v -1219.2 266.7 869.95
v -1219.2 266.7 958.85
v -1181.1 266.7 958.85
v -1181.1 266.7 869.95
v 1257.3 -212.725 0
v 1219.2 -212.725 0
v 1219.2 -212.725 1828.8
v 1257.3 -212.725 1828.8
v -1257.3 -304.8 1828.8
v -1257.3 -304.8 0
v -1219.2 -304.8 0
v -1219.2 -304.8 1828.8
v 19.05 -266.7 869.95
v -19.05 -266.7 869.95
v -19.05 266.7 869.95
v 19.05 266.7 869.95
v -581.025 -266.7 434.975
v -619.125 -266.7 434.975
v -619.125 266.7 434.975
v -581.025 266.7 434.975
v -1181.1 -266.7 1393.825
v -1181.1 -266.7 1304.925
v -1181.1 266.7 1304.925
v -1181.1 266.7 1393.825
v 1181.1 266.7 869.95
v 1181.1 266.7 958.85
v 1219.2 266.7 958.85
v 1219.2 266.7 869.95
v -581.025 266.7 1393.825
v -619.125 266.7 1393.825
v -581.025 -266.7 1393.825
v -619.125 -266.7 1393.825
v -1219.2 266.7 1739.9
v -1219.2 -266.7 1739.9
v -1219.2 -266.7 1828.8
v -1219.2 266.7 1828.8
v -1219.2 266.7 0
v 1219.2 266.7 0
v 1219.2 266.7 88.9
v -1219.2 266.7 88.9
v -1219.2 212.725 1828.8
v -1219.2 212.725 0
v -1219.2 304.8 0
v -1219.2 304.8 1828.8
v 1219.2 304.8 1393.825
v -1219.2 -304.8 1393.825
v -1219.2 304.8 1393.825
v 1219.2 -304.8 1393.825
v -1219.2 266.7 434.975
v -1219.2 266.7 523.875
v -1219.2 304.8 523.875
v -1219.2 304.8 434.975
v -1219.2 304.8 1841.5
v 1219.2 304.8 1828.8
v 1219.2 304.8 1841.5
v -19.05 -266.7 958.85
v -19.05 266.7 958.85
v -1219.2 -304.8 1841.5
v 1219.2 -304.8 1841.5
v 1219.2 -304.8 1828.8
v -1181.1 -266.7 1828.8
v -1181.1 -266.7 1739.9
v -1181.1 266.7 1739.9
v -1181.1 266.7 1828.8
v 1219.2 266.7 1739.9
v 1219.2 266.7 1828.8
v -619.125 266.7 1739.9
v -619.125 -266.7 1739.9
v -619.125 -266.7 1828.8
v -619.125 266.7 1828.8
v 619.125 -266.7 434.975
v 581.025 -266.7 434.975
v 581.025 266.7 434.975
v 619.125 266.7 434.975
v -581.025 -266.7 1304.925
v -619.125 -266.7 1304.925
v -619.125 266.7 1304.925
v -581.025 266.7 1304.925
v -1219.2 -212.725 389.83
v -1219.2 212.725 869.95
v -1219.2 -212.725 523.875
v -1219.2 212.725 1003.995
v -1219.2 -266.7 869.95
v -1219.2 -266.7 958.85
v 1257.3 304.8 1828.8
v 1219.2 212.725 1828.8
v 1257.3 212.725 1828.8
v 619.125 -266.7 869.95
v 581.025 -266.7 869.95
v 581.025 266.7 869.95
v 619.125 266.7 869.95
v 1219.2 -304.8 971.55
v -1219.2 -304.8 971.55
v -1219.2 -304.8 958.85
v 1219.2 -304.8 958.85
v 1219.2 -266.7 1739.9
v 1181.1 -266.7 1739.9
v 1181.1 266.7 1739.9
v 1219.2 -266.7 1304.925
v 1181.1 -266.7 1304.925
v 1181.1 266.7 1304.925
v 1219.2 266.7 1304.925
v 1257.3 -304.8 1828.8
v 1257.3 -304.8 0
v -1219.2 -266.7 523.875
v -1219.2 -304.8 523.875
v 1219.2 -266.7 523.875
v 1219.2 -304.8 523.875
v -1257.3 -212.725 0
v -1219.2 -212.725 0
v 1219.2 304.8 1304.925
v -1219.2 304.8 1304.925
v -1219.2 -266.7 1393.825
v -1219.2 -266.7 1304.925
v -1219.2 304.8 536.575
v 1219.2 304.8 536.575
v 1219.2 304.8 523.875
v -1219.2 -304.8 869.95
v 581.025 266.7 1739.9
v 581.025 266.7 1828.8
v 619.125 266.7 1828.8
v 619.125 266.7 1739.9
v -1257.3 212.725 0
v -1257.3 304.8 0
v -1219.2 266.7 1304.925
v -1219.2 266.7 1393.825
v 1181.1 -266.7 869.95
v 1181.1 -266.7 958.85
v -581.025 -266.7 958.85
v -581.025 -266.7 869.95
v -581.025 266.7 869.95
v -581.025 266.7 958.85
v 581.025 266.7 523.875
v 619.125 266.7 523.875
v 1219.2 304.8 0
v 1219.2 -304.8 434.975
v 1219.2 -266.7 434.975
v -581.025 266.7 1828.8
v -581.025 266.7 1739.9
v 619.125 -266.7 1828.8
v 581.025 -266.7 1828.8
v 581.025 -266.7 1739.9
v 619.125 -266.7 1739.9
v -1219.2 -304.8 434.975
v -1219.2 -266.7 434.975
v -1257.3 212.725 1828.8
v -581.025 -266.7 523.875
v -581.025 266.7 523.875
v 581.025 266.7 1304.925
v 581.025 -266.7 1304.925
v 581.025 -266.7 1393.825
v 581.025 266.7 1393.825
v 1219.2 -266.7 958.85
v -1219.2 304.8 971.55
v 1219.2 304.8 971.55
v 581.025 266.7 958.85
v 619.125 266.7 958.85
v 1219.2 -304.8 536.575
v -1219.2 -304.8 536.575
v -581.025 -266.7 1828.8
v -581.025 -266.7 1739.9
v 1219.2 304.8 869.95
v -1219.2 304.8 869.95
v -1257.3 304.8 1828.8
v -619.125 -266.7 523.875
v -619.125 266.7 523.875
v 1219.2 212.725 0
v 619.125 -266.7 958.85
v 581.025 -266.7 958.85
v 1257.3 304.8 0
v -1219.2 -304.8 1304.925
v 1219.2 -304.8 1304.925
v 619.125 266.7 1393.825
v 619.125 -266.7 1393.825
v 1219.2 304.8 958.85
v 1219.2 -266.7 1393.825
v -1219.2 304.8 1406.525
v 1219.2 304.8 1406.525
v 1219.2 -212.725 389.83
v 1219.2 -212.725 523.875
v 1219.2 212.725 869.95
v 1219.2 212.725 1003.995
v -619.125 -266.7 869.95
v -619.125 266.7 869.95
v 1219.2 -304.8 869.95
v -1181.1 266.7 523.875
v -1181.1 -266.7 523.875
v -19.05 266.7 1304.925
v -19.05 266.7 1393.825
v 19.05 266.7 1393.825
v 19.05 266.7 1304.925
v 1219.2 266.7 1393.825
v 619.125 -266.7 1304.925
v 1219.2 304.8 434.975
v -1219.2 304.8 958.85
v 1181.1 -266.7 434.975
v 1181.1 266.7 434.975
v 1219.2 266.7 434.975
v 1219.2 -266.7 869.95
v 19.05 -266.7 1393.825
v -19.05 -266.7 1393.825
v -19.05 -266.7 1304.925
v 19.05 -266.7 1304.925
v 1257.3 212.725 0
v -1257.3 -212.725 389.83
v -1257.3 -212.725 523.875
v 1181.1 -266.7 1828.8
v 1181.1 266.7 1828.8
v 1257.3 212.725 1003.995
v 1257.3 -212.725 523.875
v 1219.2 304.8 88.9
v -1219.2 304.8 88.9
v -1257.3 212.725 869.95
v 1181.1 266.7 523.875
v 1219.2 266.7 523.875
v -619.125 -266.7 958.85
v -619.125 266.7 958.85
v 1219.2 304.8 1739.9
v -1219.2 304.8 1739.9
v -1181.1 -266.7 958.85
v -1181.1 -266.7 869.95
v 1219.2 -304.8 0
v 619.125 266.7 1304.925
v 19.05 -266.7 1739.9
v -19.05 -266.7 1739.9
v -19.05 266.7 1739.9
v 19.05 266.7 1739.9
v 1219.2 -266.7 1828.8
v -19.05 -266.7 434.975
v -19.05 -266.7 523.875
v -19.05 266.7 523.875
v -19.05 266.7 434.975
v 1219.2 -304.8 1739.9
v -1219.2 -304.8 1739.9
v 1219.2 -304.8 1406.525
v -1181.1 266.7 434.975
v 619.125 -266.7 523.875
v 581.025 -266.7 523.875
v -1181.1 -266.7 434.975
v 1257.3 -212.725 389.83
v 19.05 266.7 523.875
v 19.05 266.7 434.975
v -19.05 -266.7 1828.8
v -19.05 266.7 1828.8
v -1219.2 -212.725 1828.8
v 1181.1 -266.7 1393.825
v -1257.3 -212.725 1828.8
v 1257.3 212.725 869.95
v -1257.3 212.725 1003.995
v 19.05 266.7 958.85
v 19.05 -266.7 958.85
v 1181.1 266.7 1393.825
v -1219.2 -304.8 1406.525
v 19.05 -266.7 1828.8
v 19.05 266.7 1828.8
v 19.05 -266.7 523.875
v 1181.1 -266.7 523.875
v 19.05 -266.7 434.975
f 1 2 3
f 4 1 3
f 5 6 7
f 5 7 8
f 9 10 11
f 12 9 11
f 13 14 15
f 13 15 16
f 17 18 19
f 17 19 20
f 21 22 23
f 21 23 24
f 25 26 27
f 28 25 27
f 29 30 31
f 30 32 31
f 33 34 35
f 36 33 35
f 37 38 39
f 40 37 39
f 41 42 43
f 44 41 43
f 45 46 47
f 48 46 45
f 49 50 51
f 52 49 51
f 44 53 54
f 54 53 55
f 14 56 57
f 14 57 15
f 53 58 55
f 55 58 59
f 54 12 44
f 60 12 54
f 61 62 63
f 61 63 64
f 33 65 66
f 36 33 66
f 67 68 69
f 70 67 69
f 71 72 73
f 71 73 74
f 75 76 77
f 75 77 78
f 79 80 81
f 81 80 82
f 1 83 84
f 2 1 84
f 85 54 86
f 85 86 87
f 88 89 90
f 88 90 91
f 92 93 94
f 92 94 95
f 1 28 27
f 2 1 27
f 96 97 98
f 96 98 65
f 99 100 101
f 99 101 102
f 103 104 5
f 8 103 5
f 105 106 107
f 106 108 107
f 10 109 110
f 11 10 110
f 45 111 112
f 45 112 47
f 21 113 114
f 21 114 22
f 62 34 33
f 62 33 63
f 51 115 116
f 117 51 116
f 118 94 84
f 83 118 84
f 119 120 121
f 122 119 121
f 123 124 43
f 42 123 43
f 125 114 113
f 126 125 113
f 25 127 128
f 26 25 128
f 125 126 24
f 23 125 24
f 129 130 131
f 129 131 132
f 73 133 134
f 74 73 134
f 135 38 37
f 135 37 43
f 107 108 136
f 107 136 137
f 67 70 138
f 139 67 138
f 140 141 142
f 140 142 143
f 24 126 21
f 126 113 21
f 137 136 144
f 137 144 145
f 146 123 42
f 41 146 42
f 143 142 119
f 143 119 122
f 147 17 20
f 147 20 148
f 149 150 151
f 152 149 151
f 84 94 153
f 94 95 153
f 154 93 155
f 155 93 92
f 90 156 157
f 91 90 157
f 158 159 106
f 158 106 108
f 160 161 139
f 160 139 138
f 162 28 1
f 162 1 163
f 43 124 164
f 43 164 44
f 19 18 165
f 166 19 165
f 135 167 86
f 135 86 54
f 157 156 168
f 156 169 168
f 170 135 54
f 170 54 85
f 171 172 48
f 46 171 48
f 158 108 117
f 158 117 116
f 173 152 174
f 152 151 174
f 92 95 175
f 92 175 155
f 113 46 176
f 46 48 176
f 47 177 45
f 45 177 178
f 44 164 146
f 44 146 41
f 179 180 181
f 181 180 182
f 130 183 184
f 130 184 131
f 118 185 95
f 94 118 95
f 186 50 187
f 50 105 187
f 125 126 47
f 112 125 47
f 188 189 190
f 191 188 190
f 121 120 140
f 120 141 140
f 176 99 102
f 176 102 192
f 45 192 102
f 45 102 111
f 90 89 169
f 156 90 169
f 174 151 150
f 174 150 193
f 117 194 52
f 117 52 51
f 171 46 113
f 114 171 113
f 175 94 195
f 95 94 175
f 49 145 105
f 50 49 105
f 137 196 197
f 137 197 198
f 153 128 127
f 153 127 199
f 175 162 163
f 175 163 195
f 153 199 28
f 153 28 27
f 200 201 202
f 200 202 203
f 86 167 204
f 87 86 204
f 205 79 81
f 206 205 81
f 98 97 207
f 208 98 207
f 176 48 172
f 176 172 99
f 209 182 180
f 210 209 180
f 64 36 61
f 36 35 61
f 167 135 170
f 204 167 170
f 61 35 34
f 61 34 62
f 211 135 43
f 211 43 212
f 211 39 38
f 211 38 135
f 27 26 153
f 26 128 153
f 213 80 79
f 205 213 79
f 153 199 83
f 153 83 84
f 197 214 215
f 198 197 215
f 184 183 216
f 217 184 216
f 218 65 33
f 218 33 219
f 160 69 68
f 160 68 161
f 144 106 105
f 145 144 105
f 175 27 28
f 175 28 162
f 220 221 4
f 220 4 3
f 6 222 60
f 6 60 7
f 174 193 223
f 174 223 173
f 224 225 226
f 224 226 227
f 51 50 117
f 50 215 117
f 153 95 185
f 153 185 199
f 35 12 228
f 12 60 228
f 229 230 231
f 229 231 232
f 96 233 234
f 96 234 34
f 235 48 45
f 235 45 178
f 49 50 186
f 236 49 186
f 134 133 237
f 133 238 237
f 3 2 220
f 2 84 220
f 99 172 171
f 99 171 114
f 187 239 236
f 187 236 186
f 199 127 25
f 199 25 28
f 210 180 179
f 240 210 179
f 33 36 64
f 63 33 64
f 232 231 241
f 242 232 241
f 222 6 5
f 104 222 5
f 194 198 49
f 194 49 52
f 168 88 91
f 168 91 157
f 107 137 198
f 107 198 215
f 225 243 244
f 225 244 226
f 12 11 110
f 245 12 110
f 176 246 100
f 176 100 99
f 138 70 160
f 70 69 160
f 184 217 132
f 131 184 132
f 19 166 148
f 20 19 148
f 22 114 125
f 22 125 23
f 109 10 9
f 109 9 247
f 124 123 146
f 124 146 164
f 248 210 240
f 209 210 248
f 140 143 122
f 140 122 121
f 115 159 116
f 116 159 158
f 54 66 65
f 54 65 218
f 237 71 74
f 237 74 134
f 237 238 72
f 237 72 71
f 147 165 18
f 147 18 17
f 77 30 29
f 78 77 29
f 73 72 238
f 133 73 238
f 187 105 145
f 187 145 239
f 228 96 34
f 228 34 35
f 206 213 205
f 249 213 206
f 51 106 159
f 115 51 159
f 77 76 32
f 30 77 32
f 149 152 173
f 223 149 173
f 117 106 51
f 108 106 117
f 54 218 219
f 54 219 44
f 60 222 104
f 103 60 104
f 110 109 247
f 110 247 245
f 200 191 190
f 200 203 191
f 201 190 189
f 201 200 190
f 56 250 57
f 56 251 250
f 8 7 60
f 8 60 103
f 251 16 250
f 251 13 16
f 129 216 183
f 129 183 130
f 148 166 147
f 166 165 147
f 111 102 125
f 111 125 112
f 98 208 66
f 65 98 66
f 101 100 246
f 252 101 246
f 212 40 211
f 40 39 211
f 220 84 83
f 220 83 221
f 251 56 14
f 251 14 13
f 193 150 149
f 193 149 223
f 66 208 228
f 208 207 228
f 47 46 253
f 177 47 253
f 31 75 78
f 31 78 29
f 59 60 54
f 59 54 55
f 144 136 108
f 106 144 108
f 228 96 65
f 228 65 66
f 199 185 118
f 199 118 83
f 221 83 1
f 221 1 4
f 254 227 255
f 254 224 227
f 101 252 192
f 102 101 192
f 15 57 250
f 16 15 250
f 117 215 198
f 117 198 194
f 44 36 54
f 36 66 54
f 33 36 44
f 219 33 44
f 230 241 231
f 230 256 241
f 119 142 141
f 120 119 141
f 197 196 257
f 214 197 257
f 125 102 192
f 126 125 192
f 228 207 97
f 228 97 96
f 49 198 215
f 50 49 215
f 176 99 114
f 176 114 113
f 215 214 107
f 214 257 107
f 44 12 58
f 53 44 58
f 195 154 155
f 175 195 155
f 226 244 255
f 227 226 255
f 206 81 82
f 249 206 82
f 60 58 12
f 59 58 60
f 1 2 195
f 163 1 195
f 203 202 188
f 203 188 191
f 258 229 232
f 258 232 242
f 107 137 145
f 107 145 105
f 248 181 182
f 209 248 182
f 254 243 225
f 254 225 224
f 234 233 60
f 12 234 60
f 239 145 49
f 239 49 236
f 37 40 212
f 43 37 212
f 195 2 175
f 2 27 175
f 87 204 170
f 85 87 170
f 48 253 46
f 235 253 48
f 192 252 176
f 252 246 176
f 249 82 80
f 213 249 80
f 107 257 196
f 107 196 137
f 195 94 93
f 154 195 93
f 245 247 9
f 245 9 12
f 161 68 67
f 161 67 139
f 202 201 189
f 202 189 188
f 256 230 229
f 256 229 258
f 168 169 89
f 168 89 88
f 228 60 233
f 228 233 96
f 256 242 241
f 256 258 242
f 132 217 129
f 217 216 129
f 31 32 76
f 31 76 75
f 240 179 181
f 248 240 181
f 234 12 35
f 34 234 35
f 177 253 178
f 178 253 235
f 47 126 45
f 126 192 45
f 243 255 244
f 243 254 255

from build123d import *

# Parameters (mm, degrees)
F1_W          = 38.1
F1_H          = 92.075
F2_DEPTH      = 1828.8
F3_W          = 38.1
F3_H          = 88.9
F4_DEPTH      = 1219.2
F4_DEPTH_BACK = 1219.2
F5_W          = 38.1
F5_H          = 88.9
F6_DEPTH      = 266.7
F6_DEPTH_BACK = 266.7
F7_W          = 2438.4
F7_H          = 12.7
F8_DEPTH      = 304.8
F8_DEPTH_BACK = 304.8
F10_DEPTH     = 38.1
F12_DEPTH     = 38.1


with BuildPart() as f2:
    # F1 (on Top) → F2 (new body)
    with BuildSketch(Plane.XY):
        with Locations((-1238.25, -258.7625)):
            Rectangle(F1_W, F1_H)
        with Locations((-1238.25, 258.7625)):
            Rectangle(F1_W, F1_H)
        with Locations((1238.25, -258.7625)):
            Rectangle(F1_W, F1_H)
        with Locations((1238.25, 258.7625)):
            Rectangle(F1_W, F1_H)
    extrude(amount=F2_DEPTH)


with BuildPart() as f4:
    # F3 (on Right) → F4 (new body, two sides)
    with BuildSketch(Plane.YZ) as f4_sk:
        with Locations((285.75, 1784.35)):
            Rectangle(F3_W, F3_H)
        with Locations((285.75, 1349.375)):
            Rectangle(F3_W, F3_H)
        with Locations((285.75, 914.4)):
            Rectangle(F3_W, F3_H)
        with Locations((285.75, 479.425)):
            Rectangle(F3_W, F3_H)
        with Locations((285.75, 44.45)):
            Rectangle(F3_W, F3_H)
        with Locations((-285.75, 1784.35)):
            Rectangle(F3_W, F3_H)
        with Locations((-285.75, 479.425)):
            Rectangle(F3_W, F3_H)
        with Locations((-285.75, 1349.375)):
            Rectangle(F3_W, F3_H)
        with Locations((-285.75, 914.4)):
            Rectangle(F3_W, F3_H)
    extrude(amount=F4_DEPTH)
    extrude(f4_sk.sketch, amount=-F4_DEPTH_BACK)


with BuildPart() as f6:
    # F5 (on Front) → F6 (new body, two sides)
    with BuildSketch(Plane.XZ) as f6_sk:
        with Locations((-1200.15, 914.4)):
            Rectangle(F5_W, F5_H)
        with Locations((-1200.15, 1349.375)):
            Rectangle(F5_W, F5_H)
        with Locations((-1200.15, 1784.35)):
            Rectangle(F5_W, F5_H)
        with Locations((-1200.15, 479.425)):
            Rectangle(F5_W, F5_H)
        with Locations((-600.075, 1784.35)):
            Rectangle(F5_W, F5_H)
        with Locations((-600.075, 1349.375)):
            Rectangle(F5_W, F5_H)
        with Locations((-600.075, 914.4)):
            Rectangle(F5_W, F5_H)
        with Locations((-600.075, 479.425)):
            Rectangle(F5_W, F5_H)
        Polygon((19.05, 1828.8), (0, 1828.8), (-19.05, 1828.8), (-19.05, 1739.9), (0, 1739.9), (19.05, 1739.9), align=None)
        Polygon((19.05, 1393.825), (0, 1393.825), (-19.05, 1393.825), (-19.05, 1304.925), (0, 1304.925), (19.05, 1304.925), align=None)
        Polygon((19.05, 958.85), (0, 958.85), (-19.05, 958.85), (-19.05, 869.95), (0, 869.95), (19.05, 869.95), align=None)
        Polygon((19.05, 523.875), (0, 523.875), (-19.05, 523.875), (-19.05, 434.975), (0, 434.975), (19.05, 434.975), align=None)
        with Locations((600.075, 1784.35)):
            Rectangle(F5_W, F5_H)
        with Locations((600.075, 1349.375)):
            Rectangle(F5_W, F5_H)
        with Locations((600.075, 914.4)):
            Rectangle(F5_W, F5_H)
        with Locations((1200.15, 1349.375)):
            Rectangle(F5_W, F5_H)
        with Locations((600.075, 479.425)):
            Rectangle(F5_W, F5_H)
        with Locations((1200.15, 914.4)):
            Rectangle(F5_W, F5_H)
        with Locations((1200.15, 479.425)):
            Rectangle(F5_W, F5_H)
        with Locations((1200.15, 1784.35)):
            Rectangle(F5_W, F5_H)
    extrude(amount=F6_DEPTH)
    extrude(f6_sk.sketch, amount=-F6_DEPTH_BACK)


with BuildPart() as f8:
    # F7 (on Front) → F8 (new body, two sides)
    with BuildSketch(Plane.XZ) as f8_sk:
        with Locations((0, 530.225)):
            Rectangle(F7_W, F7_H)
        with Locations((0, 965.2)):
            Rectangle(F7_W, F7_H)
        with Locations((0, 1400.175)):
            Rectangle(F7_W, F7_H)
        with Locations((0, 1835.15)):
            Rectangle(F7_W, F7_H)
    extrude(amount=F8_DEPTH)
    extrude(f8_sk.sketch, amount=-F8_DEPTH_BACK)


with BuildPart() as f10:
    # F9 (on face) → F10 (new body)
    with BuildSketch(Plane.YZ.offset(1219.2)):
        Polygon((-212.725, 523.875), (-212.725, 389.830137), (212.725, 869.95), (212.725, 1003.994863), align=None)
    extrude(amount=F10_DEPTH)


with BuildPart() as f12:
    # F11 (on face) → F12 (new body)
    with BuildSketch(Plane(origin=(-1219.2, 0, 0), x_dir=(0, -1, 0), z_dir=(-1, 0, 0))):
        Polygon((212.725, 523.875), (-212.725, 1003.994863), (-212.725, 869.95), (212.725, 389.830137), align=None)
    extrude(amount=F12_DEPTH)


solid = Compound([f2.part, f4.part, f6.part, f8.part, f10.part, f12.part])
